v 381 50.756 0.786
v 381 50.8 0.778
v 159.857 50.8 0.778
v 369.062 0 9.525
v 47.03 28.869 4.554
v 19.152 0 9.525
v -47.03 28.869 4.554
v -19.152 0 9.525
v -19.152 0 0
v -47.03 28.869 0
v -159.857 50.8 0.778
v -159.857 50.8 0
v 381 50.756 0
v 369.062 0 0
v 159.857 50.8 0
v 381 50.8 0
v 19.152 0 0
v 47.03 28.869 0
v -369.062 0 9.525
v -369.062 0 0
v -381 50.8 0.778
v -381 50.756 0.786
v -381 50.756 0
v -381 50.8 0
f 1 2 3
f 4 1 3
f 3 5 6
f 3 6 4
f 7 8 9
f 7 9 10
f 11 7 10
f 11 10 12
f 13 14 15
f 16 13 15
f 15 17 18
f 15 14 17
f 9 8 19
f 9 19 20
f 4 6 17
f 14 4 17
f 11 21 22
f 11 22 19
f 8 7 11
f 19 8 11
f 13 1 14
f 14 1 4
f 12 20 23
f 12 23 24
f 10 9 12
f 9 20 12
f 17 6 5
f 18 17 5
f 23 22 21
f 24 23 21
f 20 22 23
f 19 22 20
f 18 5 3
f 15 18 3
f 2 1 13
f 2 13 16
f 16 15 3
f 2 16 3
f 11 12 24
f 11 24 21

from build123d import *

# Parameters (mm, degrees)
F1_DEPTH = 381
F3_DEPTH = 12.7
F5_DEPTH = 12.7


with BuildPart() as f1:
    # F0 (on Right) → F1 (new body)
    with BuildSketch(Plane.YZ):
        Polygon((0, 9.525), (0, 0), (50.8, 0), (50.8, 0.778103), align=None)
    extrude(amount=F1_DEPTH)

    # F2 (on Top) → F3 (cut, symmetric)
    with BuildSketch(Plane.XY):
        Polygon((369.062, 0), (381, 0), (381, 50.756246), align=None)
    extrude(amount=F3_DEPTH, both=True, mode=Mode.SUBTRACT)

    # F4 (on Top) → F5 (cut, symmetric)
    with BuildSketch(Plane.XY):
        Polygon((0, 0), (19.1516, 0), (47.02963, 28.868545), (159.857185, 50.8), (0, 50.8), align=None)
    extrude(amount=F5_DEPTH, both=True, mode=Mode.SUBTRACT)


with BuildPart() as f6_1:
    # F6: instance of F1
    add(f1.part.mirror(Plane.YZ))


solid = Compound([f1.part, f6_1.part])
